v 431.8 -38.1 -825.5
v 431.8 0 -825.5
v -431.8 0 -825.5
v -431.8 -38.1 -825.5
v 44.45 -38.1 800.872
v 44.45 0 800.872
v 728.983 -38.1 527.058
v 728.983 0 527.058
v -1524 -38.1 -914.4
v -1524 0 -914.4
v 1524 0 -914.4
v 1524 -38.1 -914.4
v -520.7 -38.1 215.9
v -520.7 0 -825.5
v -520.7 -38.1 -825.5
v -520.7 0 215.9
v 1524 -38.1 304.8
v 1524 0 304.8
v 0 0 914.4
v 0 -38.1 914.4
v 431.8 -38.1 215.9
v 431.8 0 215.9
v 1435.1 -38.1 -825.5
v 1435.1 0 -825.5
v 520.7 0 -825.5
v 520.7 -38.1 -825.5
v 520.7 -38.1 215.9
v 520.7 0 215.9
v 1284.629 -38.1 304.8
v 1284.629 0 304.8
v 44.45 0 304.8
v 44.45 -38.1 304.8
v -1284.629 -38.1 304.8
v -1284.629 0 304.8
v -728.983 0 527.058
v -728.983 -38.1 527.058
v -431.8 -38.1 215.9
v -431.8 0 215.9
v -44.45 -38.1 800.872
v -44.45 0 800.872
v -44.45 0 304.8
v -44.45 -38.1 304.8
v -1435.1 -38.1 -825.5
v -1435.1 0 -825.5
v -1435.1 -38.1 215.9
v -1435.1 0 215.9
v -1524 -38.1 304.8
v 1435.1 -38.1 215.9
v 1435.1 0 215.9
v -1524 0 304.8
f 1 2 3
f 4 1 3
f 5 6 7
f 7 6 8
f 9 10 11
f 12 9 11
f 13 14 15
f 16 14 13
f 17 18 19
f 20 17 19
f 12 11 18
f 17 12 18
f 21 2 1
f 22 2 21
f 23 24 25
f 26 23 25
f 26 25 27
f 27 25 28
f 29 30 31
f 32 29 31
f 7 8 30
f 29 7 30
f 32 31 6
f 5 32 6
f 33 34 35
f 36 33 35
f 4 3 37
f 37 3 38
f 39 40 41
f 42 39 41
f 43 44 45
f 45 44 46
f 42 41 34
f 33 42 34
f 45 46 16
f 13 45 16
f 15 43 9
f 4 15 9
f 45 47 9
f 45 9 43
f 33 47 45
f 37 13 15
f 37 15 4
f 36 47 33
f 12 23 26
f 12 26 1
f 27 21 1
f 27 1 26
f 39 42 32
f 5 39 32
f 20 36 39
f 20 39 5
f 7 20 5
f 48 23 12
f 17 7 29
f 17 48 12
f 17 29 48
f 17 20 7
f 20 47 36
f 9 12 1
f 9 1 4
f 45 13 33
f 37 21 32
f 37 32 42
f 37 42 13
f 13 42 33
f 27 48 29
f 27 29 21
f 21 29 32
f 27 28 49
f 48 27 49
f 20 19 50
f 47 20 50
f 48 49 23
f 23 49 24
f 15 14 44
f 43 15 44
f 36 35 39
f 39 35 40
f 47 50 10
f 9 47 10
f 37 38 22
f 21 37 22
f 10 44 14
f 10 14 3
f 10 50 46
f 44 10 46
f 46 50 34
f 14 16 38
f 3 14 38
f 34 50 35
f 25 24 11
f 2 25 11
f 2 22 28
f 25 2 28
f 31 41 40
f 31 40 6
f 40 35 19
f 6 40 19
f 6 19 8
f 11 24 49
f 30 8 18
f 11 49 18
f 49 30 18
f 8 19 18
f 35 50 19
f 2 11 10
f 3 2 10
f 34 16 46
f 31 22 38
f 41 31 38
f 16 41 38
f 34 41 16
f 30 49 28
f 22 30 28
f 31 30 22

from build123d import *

# Parameters (mm, degrees)
F0_W     = 88.9
F0_H     = 1041.4
F1_DEPTH = 38.1


with BuildPart() as f1:
    # F0 (on Front) → F1 (new body)
    with BuildSketch(Plane.XZ):
        Polygon((-44.45, 800.87177), (-44.45, 896.62), (-762, 609.6), (-728.983369, 527.058422), align=None)
        Polygon((-762, 609.6), (-1524, 304.8), (-1435.1, 304.8), (-1284.629424, 304.8), (-728.983369, 527.058422), align=None)
        Polygon((44.45, 896.62), (0, 914.4), (-44.45, 896.62), (-44.45, 800.87177), (-44.45, 304.8), (0, 304.8), (44.45, 304.8), (44.45, 800.87177), align=None)
        Polygon((1435.1, 304.8), (1524, 304.8), (762, 609.6), (728.983369, 527.058422), (1284.629424, 304.8), align=None)
        Polygon((-1284.629424, 304.8), (-1435.1, 304.8), (-1435.1, 215.9), (-520.7, 215.9), (-431.8, 215.9), (431.8, 215.9), (520.7, 215.9), (1435.1, 215.9), (1435.1, 304.8), (1284.629424, 304.8), (44.45, 304.8), (0, 304.8), (-44.45, 304.8), align=None)
        Polygon((762, 609.6), (44.45, 896.62), (44.45, 800.87177), (728.983369, 527.058422), align=None)
        Polygon((1524, -914.4), (1524, 304.8), (1435.1, 304.8), (1435.1, 215.9), (1435.1, -825.5), (1435.1, -914.4), align=None)
        Polygon((-1435.1, -825.5), (-1435.1, -914.4), (1435.1, -914.4), (1435.1, -825.5), (520.7, -825.5), (431.8, -825.5), (-431.8, -825.5), (-520.7, -825.5), align=None)
        Polygon((-1435.1, 304.8), (-1524, 304.8), (-1524, -914.4), (-1435.1, -914.4), (-1435.1, -825.5), (-1435.1, 215.9), align=None)
        with Locations((-476.25, -304.8)):
            Rectangle(F0_W, F0_H)
        with Locations((476.25, -304.8)):
            Rectangle(F0_W, F0_H)
    extrude(amount=F1_DEPTH)


solid = f1.part
